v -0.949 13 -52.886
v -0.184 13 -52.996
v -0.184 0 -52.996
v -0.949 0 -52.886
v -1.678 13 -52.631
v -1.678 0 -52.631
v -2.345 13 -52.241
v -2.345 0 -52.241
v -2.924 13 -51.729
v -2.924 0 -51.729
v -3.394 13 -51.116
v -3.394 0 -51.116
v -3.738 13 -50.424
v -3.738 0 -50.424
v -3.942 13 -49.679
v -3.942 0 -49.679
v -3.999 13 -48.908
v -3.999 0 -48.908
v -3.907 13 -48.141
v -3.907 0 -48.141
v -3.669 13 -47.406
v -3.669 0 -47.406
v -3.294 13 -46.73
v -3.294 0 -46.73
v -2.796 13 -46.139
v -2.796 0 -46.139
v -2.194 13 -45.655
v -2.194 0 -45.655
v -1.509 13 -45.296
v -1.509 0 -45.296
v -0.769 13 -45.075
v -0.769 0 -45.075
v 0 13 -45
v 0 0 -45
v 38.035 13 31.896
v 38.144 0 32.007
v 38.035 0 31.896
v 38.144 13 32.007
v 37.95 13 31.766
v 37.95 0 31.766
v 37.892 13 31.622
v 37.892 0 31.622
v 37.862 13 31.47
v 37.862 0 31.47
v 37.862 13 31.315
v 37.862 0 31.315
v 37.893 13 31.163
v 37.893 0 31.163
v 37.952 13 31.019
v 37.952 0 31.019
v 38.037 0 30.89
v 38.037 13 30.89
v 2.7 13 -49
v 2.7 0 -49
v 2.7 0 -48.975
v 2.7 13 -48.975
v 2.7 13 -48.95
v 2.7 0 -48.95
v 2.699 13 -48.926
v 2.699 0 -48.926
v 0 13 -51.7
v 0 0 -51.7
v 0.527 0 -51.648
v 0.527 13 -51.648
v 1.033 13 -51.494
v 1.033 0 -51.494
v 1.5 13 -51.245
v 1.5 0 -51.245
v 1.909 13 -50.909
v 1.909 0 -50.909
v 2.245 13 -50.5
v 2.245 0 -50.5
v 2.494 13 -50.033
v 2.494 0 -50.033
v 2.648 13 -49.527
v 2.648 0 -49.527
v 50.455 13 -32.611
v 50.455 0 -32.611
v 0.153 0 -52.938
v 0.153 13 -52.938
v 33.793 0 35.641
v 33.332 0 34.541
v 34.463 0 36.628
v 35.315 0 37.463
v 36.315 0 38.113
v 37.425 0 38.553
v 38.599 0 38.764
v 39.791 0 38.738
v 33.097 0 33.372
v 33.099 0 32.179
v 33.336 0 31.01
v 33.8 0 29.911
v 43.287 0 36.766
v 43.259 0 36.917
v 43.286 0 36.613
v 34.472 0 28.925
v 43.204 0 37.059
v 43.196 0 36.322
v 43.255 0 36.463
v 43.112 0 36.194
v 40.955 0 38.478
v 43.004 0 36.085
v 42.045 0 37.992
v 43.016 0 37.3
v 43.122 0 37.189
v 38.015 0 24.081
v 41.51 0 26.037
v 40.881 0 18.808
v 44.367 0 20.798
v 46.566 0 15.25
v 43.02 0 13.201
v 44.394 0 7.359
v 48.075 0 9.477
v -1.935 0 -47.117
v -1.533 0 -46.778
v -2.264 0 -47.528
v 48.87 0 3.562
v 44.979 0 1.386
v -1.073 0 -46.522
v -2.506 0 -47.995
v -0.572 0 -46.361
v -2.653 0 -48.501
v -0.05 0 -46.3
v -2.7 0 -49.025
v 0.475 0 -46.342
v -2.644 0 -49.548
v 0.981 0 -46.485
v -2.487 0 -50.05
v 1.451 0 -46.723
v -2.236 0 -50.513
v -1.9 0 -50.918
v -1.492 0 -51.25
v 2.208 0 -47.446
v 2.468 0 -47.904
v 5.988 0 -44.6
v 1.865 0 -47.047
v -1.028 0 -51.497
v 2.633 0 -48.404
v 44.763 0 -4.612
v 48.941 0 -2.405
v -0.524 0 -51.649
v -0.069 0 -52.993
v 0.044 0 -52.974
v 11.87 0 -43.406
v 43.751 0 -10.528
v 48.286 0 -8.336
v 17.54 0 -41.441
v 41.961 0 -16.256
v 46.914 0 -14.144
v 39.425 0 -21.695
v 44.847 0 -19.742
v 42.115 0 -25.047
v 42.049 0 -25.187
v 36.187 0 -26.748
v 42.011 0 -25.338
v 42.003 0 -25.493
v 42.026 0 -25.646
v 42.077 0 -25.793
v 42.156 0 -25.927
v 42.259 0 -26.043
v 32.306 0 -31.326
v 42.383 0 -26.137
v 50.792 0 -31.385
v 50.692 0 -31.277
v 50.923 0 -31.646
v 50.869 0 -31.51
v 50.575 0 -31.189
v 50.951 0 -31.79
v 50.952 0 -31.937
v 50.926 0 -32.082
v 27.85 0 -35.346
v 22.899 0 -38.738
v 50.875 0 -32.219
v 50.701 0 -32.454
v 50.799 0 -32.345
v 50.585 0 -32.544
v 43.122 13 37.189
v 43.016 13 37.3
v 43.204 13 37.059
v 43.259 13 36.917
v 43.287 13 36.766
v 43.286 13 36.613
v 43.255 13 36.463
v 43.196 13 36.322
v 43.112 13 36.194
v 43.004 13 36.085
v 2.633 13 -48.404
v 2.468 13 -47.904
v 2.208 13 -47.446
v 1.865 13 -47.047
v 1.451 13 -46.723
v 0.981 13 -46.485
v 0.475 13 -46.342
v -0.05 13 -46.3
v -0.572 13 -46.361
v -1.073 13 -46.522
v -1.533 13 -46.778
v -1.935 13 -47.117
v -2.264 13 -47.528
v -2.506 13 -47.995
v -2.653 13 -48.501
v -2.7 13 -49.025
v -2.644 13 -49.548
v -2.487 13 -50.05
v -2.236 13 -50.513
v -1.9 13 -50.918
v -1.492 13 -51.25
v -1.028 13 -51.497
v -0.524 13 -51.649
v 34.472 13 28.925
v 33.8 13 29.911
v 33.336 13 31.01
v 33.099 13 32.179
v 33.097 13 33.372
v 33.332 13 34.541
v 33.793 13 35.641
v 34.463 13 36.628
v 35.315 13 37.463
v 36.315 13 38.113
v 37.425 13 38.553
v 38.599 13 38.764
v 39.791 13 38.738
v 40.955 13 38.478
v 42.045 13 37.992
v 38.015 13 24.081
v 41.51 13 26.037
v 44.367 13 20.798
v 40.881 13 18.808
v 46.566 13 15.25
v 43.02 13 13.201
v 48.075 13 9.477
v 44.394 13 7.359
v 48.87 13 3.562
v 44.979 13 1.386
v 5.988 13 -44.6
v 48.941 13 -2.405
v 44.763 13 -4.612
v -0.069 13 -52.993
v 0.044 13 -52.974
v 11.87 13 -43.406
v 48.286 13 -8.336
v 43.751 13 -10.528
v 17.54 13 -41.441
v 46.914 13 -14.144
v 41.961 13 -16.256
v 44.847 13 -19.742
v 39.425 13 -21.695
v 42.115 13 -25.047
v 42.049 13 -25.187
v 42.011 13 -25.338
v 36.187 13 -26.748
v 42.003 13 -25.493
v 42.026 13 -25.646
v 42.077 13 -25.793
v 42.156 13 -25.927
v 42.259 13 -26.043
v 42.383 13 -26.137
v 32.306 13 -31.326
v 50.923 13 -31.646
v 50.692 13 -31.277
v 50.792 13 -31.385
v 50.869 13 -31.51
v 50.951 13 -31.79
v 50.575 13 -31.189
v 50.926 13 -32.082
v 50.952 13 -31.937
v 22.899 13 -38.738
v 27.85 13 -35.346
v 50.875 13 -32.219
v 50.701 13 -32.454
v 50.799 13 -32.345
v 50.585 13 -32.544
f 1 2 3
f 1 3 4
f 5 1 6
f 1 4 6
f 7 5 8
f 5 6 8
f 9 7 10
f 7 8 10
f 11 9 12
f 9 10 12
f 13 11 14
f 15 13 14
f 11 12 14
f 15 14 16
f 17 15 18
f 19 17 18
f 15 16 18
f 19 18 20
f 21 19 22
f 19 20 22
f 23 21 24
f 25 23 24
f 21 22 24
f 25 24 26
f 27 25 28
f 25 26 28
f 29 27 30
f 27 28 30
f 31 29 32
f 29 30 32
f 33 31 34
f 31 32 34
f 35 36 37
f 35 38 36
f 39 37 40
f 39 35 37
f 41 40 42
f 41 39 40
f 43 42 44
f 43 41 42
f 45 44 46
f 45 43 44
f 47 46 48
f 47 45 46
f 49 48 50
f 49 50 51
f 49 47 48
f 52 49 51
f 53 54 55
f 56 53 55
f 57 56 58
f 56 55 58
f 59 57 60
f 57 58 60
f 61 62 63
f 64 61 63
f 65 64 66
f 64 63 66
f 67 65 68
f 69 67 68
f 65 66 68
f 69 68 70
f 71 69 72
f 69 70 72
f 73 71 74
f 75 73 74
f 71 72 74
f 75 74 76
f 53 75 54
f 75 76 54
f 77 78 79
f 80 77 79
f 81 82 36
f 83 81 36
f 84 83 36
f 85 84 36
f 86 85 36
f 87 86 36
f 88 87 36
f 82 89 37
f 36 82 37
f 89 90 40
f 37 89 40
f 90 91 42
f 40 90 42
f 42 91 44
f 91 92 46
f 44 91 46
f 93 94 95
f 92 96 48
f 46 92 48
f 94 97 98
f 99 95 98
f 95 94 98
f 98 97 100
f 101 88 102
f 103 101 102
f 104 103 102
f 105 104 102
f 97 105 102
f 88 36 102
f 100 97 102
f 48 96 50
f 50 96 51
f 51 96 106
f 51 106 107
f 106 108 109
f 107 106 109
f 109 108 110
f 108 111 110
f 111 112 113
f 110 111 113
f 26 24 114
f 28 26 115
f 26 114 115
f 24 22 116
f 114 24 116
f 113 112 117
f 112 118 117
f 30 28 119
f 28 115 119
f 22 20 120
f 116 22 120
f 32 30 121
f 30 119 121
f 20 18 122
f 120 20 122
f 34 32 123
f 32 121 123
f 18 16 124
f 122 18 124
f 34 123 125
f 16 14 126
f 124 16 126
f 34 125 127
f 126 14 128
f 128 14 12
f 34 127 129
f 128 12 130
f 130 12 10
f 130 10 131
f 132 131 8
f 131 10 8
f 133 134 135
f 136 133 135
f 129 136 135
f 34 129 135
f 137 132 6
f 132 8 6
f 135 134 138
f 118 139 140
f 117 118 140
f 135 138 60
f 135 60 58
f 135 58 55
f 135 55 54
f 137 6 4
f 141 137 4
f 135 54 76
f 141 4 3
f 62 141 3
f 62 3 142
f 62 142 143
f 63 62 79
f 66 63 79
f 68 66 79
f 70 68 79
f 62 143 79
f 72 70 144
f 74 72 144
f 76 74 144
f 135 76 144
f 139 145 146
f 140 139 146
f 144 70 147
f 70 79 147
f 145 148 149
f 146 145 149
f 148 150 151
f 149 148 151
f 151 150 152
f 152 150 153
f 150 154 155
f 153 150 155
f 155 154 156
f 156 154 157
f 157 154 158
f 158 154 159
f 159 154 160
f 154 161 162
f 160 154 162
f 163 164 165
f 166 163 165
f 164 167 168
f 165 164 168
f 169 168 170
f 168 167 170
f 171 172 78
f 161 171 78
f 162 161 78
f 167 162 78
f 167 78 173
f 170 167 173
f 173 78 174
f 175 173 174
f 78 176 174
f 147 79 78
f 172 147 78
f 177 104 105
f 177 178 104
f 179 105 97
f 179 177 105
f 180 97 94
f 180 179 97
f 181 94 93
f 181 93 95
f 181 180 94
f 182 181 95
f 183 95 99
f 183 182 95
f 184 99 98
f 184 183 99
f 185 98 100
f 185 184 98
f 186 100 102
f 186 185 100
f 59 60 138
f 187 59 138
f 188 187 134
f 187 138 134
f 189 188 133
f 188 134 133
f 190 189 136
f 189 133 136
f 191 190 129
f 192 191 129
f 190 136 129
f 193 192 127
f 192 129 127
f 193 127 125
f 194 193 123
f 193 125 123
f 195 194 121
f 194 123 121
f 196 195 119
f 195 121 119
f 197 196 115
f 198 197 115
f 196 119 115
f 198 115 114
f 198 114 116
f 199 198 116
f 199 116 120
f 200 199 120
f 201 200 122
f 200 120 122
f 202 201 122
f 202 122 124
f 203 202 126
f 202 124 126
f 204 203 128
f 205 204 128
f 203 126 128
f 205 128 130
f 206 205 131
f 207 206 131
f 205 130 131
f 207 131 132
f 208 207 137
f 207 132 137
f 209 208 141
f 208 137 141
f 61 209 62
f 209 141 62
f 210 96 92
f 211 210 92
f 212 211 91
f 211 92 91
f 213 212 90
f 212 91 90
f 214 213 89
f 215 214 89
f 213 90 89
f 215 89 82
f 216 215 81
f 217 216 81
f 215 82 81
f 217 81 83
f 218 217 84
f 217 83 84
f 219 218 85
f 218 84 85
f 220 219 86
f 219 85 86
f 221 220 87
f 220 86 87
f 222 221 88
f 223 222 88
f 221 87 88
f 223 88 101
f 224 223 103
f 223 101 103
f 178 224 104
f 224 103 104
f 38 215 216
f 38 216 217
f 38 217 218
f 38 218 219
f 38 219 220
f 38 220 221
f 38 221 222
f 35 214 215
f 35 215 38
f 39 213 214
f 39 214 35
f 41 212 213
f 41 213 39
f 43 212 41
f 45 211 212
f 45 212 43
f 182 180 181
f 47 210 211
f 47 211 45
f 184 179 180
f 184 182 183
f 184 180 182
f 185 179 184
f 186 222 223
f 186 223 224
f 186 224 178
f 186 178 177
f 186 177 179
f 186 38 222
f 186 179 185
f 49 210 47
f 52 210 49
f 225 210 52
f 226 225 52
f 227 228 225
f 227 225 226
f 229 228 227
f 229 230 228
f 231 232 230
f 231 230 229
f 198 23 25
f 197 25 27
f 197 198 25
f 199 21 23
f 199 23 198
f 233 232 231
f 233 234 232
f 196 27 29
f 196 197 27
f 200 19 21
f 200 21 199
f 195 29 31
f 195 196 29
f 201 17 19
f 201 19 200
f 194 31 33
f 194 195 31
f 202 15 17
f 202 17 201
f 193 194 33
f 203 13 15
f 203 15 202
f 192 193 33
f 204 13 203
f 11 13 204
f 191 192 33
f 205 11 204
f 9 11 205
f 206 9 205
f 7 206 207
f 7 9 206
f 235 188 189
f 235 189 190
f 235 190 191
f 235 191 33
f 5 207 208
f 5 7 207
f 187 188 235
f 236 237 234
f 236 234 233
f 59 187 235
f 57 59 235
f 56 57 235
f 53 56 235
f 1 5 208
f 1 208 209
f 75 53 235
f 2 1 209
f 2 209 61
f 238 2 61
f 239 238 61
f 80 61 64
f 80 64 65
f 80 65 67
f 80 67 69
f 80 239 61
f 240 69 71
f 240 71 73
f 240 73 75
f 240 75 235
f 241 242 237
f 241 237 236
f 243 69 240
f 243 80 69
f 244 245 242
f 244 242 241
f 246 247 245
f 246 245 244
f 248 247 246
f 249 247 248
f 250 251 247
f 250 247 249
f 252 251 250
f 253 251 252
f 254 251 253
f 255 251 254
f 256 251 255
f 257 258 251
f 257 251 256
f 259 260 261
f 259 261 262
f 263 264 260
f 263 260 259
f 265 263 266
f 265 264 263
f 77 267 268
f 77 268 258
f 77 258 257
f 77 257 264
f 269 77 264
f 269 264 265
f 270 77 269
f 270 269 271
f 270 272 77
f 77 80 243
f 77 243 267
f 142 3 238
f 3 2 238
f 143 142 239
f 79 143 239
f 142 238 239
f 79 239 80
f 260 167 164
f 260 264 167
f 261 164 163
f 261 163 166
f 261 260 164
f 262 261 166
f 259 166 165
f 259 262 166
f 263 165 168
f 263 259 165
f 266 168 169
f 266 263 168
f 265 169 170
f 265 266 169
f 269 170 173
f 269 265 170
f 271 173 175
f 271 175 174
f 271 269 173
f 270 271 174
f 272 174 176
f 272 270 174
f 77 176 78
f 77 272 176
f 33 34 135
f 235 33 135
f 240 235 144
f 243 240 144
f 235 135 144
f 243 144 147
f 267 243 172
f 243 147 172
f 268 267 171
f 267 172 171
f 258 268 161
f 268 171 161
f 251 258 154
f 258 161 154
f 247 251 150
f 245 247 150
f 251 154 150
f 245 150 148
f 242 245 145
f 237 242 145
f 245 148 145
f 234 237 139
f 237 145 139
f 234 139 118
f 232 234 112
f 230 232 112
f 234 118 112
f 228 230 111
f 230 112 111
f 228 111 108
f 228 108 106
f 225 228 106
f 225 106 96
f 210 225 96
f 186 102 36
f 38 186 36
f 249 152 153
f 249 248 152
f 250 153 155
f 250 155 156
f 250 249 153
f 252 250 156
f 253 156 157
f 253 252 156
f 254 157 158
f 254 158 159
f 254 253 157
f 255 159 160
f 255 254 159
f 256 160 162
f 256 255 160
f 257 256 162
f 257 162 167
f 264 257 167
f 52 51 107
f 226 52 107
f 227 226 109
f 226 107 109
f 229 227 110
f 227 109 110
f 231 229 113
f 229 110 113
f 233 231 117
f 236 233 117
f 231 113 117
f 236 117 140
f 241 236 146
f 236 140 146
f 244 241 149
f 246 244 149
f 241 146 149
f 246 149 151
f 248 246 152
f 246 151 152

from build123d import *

# Parameters (mm, degrees)
BOSS_EXTRUDE1_DEPTH = 13
FILLET1_R           = 0.8


with BuildPart() as part:
    # Sketch1 → Boss-Extrude1 (new body)
    with BuildSketch(Plane(origin=(0, 0, 0), x_dir=(1, 0, 0), z_dir=(0, 1, 0))):
        with BuildLine():
            Line((0, 51.7), (0, 53))
            ThreePointArc((0, 53), (-4, 49), (0, 45))
            ThreePointArc((0, 45), (40.783850417, 19.017821778), (34.47199994, -28.925442436))
            ThreePointArc((34.47199994, -28.925442436), (35.211540941, -37.378434753), (43.664533258, -36.638893752))
            Line((43.664533258, -36.638893752), (37.536177713, -31.496592875))
            ThreePointArc((37.536177713, -31.496592875), (48.870327604, -3.562454189), (41.707047143, 25.720074234))
            ThreePointArc((41.707047143, 25.720074234), (25.051905135, 42.111780407), (2.698975076, 48.925612245))
            ThreePointArc((2.698975076, 48.925612245), (-1.935309657, 47.117295421), (0, 51.7))
        make_face()
        with BuildLine():
            Line((51.921017872, 32.018867925), (0, 53))
            Line((0, 53), (0, 51.7))
            ThreePointArc((0, 51.7), (1.909188309, 50.909188309), (2.7, 49))
            ThreePointArc((2.7, 49), (2.699743757, 48.962802592), (2.698975076, 48.925612245))
            ThreePointArc((2.698975076, 48.925612245), (25.051905135, 42.111780407), (41.707047143, 25.720074234))
            Line((41.707047143, 25.720074234), (51.921017872, 32.018867925))
        make_face()
    extrude(amount=BOSS_EXTRUDE1_DEPTH)

    # Fillet1
    fillet1_edges = [part.edges().sort_by_distance(p)[0] for p in [
        (0, 6.5, -53),
        (51.921017872, 6.5, -32.018867925),
        (41.707047143, 6.5, -25.720074234),
        (37.536177713, 6.5, 31.496592875),
        (43.664533258, 6.5, 36.638893752),
    ]]
    fillet(fillet1_edges, radius=FILLET1_R)


solid = part.part
